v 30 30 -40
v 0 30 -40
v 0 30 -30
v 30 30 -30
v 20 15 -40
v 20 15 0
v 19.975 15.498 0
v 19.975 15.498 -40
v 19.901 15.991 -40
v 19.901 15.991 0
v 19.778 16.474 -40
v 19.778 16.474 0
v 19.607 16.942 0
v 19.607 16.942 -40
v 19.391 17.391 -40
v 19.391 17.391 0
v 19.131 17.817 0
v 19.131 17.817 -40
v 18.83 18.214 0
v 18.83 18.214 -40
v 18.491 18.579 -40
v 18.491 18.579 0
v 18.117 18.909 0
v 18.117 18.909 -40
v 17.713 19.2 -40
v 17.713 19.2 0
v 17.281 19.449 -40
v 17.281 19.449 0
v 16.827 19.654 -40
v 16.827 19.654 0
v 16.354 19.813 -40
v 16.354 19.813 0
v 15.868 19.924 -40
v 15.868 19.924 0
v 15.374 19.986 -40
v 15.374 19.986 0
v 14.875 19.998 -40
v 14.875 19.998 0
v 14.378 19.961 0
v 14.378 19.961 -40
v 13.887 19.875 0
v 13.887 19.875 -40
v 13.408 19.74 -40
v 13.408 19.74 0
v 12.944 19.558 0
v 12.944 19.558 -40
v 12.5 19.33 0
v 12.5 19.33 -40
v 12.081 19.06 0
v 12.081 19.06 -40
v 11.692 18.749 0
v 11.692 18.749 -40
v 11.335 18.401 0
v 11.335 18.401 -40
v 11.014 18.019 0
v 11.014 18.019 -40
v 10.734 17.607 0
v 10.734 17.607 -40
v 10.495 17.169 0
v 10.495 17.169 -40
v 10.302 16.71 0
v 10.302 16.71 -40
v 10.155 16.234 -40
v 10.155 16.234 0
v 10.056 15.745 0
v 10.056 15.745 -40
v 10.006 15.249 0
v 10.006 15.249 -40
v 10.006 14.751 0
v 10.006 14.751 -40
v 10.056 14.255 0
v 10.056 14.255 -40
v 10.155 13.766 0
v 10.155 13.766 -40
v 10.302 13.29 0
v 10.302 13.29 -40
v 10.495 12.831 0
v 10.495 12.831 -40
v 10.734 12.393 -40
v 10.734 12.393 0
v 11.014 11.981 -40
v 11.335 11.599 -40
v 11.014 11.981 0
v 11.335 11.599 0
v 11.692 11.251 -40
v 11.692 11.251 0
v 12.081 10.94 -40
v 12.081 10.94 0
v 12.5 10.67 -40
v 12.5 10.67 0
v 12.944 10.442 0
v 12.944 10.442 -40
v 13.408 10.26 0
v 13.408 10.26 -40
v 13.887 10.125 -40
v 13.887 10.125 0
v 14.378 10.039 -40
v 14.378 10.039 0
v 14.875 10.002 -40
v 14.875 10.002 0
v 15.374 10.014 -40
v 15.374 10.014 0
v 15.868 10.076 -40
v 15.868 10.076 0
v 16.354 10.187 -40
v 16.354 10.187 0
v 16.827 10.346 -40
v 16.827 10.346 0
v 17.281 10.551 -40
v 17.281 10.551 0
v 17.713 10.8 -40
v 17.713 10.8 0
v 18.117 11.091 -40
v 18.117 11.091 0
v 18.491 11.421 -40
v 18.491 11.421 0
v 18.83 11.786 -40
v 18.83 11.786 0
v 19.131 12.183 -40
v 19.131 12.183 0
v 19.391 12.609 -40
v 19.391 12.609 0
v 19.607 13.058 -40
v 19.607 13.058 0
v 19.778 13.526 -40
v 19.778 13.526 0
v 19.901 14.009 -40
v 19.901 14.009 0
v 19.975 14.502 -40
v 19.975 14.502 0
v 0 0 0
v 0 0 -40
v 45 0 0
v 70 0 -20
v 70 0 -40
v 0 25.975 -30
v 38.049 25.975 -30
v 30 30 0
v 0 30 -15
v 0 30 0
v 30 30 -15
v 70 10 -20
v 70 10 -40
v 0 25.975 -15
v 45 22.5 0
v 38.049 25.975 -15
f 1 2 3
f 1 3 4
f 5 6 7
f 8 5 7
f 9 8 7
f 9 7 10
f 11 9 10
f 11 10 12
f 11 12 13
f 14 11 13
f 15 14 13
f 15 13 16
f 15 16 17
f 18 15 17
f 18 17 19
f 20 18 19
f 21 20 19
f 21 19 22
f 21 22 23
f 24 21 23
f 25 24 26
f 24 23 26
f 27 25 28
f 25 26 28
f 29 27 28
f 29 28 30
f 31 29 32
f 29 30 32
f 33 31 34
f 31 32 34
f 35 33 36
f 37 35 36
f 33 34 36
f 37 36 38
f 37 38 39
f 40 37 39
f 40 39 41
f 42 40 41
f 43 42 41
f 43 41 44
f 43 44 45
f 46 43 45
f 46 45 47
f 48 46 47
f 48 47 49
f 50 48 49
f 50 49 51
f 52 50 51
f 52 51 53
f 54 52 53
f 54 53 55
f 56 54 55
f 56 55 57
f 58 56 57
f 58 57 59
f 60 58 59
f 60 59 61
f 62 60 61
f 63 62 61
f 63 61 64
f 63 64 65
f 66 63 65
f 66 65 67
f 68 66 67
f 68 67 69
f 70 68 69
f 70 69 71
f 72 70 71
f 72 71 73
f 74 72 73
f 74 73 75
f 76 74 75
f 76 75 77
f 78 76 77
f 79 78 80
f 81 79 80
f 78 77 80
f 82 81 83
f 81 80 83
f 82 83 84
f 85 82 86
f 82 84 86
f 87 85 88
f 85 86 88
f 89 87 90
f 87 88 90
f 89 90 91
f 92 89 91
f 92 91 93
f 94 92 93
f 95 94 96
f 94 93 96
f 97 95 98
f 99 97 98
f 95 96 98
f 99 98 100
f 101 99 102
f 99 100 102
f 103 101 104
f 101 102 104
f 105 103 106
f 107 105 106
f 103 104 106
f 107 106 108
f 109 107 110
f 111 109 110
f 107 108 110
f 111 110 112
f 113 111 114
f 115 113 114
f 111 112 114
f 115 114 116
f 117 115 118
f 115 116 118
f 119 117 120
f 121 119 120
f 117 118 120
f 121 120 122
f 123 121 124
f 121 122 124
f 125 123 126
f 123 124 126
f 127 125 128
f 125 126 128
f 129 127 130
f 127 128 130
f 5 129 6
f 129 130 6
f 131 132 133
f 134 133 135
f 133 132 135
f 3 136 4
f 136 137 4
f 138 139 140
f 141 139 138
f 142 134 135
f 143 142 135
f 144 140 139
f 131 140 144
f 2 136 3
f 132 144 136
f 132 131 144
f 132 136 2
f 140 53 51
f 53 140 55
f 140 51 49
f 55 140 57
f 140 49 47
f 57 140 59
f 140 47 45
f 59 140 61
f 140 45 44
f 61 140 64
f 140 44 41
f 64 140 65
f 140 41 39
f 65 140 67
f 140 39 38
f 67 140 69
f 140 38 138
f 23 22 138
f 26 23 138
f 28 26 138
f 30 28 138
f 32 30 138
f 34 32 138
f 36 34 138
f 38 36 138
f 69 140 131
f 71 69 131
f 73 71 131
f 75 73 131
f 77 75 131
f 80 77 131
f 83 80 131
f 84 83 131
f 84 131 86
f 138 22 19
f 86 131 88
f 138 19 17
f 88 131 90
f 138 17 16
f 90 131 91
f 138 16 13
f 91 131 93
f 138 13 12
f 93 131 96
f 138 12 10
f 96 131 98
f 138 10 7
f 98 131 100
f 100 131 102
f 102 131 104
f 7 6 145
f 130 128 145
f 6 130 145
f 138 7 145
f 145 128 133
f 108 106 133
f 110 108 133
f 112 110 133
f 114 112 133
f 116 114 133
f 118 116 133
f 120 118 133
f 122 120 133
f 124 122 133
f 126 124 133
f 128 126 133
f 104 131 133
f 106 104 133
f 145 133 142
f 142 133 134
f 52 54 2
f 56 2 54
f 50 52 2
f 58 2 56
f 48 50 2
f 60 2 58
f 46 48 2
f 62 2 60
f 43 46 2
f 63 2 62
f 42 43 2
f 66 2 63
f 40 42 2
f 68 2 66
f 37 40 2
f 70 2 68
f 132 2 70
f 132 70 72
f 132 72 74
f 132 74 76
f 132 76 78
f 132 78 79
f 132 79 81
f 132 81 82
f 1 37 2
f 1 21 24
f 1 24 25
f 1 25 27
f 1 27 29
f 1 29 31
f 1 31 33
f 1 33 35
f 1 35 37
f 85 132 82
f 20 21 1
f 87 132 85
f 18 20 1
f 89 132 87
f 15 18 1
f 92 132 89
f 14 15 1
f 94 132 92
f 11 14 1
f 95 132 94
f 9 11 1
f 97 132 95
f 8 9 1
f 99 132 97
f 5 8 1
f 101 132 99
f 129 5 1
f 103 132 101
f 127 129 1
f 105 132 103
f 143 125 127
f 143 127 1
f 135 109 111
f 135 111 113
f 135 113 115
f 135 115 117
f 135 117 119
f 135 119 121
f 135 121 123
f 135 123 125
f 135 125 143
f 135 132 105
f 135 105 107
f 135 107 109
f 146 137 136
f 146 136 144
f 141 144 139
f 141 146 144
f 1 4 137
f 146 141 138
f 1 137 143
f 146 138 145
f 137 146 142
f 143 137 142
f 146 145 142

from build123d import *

# Parameters (mm, degrees)
SKETCH1_W           = 70
SKETCH1_H           = 40
BOSS_EXTRUDE1_DEPTH = 30
CUT_EXTRUDE1_DEPTH  = 41
CUT_EXTRUDE2_DEPTH  = 31
SKETCH4_W           = 15
SKETCH4_H           = 4.024531718
CUT_EXTRUDE3_DEPTH  = 71
SKETCH5_R           = 5
CUT_EXTRUDE4_DEPTH  = 41


with BuildPart() as part:
    # Sketch1 → Boss-Extrude1 (new body)
    with BuildSketch(Plane(origin=(0, 0, 0), x_dir=(1, 0, 0), z_dir=(0, 1, 0))):
        with Locations((35, 20)):
            Rectangle(SKETCH1_W, SKETCH1_H)
    extrude(amount=BOSS_EXTRUDE1_DEPTH)

    # Sketch2 → Cut-Extrude1 (cut, through all)
    with BuildSketch(Plane.XY):
        Polygon((70, 30), (30, 30), (70, 10), align=None)
    extrude(amount=-CUT_EXTRUDE1_DEPTH, mode=Mode.SUBTRACT)

    # Sketch3 → Cut-Extrude2 (cut, through all)
    with BuildSketch(Plane(origin=(0, 0, 0), x_dir=(-1, 0, 0), z_dir=(0, -1, 0))):
        Polygon((-70, 0), (-45, 0), (-70, 20), align=None)
    extrude(amount=-CUT_EXTRUDE2_DEPTH, mode=Mode.SUBTRACT)

    # Sketch4 → Cut-Extrude3 (cut, through all)
    with BuildSketch(Plane.ZY):
        with Locations((-22.5, 27.987734141)):
            Rectangle(SKETCH4_W, SKETCH4_H)
    extrude(amount=-CUT_EXTRUDE3_DEPTH, mode=Mode.SUBTRACT)

    # Sketch5 → Cut-Extrude4 (cut, through all)
    with BuildSketch(Plane.XY):
        with Locations((15, 15)):
            Circle(SKETCH5_R)
    extrude(amount=-CUT_EXTRUDE4_DEPTH, mode=Mode.SUBTRACT)


solid = part.part
